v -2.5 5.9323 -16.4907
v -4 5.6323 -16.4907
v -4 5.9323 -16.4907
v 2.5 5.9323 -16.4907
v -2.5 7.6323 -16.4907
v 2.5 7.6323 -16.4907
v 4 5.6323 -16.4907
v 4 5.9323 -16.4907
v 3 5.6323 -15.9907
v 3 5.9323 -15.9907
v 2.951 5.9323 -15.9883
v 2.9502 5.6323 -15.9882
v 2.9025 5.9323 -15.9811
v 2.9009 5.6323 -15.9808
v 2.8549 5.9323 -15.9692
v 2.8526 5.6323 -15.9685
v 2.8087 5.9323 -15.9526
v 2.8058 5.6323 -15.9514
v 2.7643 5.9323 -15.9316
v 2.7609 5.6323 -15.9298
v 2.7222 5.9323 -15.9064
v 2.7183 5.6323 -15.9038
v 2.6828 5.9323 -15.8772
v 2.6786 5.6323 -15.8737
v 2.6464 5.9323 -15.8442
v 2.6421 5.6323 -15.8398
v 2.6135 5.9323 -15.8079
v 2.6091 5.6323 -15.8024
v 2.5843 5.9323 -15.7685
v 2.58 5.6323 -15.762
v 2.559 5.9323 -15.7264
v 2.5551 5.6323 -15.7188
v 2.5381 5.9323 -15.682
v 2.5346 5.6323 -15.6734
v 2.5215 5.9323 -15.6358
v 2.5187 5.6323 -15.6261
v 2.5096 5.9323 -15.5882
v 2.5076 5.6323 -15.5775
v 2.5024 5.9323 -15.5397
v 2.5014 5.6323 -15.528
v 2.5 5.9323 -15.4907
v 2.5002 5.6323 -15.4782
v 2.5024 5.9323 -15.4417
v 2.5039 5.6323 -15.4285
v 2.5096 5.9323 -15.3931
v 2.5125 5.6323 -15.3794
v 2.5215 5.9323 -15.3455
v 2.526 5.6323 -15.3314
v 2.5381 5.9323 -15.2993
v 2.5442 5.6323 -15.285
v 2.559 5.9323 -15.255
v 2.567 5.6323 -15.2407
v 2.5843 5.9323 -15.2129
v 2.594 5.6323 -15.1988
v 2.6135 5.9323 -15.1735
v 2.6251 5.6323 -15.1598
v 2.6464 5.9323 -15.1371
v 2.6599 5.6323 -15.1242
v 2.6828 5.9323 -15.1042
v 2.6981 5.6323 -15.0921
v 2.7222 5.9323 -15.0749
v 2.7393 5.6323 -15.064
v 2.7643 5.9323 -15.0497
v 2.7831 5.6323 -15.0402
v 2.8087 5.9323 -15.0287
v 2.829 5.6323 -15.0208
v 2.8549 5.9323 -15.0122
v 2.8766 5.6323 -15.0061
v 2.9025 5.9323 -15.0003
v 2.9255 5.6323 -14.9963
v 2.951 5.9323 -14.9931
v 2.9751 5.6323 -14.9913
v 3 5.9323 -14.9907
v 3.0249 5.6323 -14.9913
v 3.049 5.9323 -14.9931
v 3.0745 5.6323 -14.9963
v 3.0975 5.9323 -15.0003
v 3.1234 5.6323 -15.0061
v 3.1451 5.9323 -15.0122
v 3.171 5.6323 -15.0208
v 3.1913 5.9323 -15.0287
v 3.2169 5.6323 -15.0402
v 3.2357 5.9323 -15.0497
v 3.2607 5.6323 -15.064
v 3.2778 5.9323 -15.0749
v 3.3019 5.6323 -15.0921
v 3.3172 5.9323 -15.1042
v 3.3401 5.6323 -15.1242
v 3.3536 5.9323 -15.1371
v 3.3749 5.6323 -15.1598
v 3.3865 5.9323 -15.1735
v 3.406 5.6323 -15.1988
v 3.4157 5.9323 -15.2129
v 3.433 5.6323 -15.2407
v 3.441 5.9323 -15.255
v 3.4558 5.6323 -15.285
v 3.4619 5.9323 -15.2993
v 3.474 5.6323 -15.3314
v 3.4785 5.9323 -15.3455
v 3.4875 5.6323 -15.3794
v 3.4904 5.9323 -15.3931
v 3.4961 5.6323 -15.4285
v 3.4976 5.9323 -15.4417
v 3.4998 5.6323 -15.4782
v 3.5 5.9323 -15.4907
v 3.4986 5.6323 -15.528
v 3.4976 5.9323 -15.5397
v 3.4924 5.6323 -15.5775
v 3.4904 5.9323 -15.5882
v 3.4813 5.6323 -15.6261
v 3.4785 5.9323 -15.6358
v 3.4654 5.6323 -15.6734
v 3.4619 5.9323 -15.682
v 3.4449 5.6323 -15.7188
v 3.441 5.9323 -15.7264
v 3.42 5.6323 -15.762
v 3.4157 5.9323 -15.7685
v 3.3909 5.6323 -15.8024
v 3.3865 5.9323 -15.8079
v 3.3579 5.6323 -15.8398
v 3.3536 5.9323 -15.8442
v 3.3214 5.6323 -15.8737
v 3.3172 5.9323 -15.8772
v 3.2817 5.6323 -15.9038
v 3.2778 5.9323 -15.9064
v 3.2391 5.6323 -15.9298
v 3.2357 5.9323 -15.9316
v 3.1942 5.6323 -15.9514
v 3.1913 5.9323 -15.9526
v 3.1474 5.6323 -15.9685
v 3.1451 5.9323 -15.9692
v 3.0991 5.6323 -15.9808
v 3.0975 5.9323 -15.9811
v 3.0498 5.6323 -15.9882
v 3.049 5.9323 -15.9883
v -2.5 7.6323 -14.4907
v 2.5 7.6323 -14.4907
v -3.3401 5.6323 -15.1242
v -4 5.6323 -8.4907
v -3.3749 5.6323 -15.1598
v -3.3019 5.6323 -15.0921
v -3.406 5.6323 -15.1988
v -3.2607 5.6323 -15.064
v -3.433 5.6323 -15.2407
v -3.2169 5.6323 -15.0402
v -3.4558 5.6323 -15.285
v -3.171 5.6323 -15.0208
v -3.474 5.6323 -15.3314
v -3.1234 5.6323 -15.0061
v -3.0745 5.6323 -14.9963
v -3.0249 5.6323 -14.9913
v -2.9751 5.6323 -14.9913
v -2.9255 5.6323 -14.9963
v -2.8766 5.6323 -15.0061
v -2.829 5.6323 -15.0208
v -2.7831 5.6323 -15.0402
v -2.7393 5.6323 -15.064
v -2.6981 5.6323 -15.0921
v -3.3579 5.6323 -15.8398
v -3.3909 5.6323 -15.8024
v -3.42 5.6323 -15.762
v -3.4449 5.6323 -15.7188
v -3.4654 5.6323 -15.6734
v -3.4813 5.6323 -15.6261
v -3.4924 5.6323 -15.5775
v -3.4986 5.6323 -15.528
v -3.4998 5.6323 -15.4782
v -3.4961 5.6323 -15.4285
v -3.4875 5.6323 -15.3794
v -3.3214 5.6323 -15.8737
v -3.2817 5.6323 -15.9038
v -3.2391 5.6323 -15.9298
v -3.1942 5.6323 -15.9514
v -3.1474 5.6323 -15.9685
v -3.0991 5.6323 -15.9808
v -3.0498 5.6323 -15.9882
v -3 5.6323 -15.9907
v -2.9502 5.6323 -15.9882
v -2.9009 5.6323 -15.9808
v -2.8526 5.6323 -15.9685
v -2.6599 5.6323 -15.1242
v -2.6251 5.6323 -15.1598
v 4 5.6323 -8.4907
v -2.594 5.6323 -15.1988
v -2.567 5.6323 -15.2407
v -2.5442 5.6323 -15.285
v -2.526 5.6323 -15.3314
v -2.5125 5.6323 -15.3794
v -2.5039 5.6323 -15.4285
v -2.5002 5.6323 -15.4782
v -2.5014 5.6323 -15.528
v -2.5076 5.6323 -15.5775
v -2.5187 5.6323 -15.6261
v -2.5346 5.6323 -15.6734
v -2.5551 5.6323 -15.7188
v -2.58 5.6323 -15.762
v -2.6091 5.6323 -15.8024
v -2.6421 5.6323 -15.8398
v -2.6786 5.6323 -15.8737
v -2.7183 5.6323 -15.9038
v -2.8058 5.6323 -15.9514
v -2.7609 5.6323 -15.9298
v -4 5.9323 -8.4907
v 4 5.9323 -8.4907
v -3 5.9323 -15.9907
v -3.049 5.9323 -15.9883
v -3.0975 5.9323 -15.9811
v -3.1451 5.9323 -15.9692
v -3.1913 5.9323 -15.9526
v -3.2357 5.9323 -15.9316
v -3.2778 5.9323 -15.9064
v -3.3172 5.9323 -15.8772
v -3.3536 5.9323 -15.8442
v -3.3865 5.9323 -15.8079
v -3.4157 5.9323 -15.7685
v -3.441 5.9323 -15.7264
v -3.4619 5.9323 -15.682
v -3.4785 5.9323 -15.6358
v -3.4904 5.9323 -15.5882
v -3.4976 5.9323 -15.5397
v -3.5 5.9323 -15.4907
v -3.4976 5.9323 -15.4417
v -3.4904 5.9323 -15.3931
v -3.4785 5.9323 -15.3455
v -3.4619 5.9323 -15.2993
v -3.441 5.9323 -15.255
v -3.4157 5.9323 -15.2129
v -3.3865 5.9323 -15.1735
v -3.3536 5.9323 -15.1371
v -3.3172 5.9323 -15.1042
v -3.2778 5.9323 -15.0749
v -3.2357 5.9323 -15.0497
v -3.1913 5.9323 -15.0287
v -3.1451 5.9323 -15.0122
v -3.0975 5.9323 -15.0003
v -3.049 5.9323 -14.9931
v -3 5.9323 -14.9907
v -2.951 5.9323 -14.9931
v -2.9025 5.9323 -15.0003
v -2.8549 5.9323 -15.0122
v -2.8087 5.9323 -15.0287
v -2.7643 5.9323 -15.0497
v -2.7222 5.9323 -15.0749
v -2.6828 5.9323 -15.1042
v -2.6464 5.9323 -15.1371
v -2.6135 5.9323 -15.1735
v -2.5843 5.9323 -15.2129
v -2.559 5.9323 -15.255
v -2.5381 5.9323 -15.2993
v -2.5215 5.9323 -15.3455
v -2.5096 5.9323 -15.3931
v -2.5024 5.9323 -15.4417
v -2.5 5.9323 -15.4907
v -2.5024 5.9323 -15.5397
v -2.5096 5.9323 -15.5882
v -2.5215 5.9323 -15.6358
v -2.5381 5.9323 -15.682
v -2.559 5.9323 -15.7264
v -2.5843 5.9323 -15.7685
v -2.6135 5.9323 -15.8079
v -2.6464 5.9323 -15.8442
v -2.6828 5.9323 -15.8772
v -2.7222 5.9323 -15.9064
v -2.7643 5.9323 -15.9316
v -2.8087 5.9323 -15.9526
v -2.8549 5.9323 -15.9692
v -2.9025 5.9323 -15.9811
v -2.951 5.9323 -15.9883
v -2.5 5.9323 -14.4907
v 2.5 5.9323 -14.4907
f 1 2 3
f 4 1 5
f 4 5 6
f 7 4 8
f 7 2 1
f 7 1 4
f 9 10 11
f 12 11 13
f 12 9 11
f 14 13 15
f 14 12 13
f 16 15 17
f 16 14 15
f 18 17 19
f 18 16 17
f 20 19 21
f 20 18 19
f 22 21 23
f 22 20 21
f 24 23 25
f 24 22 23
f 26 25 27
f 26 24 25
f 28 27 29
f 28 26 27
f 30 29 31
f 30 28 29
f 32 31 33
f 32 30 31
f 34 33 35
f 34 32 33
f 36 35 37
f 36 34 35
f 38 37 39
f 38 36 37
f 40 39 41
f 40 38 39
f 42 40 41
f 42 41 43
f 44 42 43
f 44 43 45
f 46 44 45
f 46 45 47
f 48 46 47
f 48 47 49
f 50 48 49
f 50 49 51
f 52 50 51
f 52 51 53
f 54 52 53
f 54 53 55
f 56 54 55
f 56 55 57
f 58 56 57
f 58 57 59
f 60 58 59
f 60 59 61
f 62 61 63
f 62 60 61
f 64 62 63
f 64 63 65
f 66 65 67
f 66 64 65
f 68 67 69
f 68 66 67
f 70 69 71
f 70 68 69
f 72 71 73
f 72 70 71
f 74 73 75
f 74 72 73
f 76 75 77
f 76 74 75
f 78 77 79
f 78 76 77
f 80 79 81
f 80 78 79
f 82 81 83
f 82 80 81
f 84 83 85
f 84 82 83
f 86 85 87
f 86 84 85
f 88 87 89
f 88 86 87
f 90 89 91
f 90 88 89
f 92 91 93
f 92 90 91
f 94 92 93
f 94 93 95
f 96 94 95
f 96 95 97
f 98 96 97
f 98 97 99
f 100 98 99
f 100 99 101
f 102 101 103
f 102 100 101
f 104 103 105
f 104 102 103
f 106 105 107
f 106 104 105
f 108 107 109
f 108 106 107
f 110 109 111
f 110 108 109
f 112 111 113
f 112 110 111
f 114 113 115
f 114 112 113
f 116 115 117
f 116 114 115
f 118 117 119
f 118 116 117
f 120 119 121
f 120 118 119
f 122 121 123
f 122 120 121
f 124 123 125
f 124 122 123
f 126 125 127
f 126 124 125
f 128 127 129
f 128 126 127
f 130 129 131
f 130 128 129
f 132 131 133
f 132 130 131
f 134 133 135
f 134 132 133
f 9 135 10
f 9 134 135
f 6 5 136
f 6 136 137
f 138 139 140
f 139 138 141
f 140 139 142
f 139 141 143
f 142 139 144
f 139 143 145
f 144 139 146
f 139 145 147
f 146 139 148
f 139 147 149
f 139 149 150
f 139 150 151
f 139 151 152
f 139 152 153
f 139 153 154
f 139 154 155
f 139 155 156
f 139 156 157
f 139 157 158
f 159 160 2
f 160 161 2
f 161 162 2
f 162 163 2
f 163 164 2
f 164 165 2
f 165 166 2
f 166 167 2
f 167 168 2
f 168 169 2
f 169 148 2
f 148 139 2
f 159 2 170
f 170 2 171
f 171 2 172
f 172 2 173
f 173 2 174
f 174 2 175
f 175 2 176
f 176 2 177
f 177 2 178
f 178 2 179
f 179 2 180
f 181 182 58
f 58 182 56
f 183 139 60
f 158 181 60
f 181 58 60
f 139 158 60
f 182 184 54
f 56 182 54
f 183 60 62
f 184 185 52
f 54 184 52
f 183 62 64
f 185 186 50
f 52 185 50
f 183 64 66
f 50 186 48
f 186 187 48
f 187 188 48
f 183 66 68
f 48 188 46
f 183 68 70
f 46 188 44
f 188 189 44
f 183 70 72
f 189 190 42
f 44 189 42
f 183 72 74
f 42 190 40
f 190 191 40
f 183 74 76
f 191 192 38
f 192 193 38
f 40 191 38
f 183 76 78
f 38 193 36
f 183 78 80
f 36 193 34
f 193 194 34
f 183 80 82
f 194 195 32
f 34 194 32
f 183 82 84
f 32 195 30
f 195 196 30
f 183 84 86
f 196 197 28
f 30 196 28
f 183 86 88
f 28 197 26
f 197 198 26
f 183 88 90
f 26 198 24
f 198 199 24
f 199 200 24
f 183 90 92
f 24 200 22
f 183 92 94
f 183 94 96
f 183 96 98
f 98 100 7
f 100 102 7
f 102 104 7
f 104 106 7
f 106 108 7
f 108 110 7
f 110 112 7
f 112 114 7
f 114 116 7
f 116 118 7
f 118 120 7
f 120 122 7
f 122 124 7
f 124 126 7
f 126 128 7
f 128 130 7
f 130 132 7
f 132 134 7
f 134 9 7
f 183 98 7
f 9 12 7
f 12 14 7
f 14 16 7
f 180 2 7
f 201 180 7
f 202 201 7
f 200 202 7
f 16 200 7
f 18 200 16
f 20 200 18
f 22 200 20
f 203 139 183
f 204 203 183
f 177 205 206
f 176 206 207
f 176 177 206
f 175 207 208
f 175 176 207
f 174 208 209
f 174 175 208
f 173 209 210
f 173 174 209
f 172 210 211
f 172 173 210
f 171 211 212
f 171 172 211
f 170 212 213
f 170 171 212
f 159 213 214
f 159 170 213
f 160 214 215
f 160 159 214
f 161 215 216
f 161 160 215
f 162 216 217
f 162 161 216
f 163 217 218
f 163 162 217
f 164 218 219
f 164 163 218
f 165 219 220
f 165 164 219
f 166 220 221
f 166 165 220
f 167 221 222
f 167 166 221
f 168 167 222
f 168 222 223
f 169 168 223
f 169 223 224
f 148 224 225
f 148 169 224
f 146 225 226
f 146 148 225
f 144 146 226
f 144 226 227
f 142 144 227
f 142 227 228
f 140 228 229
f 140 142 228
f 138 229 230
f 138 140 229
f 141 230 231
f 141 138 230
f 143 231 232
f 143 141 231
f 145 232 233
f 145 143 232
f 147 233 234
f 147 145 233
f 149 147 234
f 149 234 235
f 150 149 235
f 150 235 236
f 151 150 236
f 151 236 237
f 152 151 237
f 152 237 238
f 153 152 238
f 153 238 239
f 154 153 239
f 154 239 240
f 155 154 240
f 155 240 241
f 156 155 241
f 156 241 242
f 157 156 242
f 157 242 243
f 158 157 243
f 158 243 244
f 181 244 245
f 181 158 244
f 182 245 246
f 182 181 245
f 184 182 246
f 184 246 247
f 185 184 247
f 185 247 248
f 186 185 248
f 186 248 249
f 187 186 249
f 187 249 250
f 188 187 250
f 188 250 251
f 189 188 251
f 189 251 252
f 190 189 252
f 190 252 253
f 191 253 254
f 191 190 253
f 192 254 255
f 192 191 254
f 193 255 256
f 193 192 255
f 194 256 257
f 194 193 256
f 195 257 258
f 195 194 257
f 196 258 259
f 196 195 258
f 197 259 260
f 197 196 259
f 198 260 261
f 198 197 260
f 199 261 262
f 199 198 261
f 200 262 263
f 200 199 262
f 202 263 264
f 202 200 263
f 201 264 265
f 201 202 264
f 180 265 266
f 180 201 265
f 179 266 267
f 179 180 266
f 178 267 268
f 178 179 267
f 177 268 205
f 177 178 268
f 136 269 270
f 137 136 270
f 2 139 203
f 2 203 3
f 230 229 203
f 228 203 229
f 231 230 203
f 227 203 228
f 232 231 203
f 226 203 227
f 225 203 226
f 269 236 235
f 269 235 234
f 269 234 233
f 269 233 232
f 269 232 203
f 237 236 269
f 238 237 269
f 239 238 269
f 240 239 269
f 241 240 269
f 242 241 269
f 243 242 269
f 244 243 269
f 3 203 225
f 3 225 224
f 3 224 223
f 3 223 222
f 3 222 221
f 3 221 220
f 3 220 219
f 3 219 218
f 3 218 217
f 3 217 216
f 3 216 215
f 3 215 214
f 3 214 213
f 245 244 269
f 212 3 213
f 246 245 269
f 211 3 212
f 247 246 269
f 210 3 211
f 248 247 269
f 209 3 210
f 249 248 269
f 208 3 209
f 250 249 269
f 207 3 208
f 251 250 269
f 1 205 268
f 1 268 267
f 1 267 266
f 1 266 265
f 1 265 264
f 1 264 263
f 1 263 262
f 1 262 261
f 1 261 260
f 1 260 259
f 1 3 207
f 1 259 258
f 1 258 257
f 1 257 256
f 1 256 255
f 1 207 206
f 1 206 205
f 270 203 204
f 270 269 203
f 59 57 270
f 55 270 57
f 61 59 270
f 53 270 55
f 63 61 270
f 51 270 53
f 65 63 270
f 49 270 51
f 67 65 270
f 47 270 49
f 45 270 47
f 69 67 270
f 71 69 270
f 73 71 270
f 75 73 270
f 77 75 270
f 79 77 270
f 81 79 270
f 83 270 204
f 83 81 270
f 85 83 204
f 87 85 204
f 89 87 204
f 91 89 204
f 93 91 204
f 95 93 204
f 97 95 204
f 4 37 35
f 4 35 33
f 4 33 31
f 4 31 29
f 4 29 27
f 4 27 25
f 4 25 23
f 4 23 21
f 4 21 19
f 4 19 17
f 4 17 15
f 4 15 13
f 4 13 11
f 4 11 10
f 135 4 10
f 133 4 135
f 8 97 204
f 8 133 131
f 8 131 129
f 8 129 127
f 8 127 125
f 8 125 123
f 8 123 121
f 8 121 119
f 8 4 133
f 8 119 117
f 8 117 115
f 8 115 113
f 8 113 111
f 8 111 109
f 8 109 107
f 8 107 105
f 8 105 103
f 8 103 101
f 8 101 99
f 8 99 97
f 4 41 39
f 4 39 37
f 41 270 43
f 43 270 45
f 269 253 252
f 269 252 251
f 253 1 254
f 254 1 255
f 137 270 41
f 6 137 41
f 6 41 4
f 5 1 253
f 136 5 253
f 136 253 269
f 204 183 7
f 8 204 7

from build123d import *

# Parameters (mm, degrees)
SKETCH1_W           = 80
SKETCH1_H           = 80
SKETCH1_R           = 5
BOSS_EXTRUDE2_DEPTH = 3
BOSS_EXTRUDE3_DEPTH = 20
SCALE2_SCALE        = 0.1


with BuildPart() as part:
    # Sketch1 → Boss-Extrude2 (new body)
    with BuildSketch(Plane(origin=(0, 0, 0), x_dir=(1, 0, 0), z_dir=(0, 1, 0))):
        Rectangle(SKETCH1_W, SKETCH1_H)
        with Locations((-30, 30)):
            Circle(SKETCH1_R, mode=Mode.SUBTRACT)
        with Locations((30, 30)):
            Circle(SKETCH1_R, mode=Mode.SUBTRACT)
    extrude(amount=BOSS_EXTRUDE2_DEPTH)

    # Sketch1<5> → Boss-Extrude3 (add)
    with BuildSketch(Plane(origin=(0, 0, 0), x_dir=(1, 0, 0), z_dir=(0, 1, 0))):
        Polygon((25, 40), (-25, 40), (-25, 30), (-25, 20), (25, 20), (25, 30), align=None)
    extrude(amount=BOSS_EXTRUDE3_DEPTH)


with BuildPart() as part_1:
    # Scale2: scaled about (0, 6.258071502, -13.878534205)
    add(part.part.scale(SCALE2_SCALE).moved(Location((0, 5.632264352, -12.490680785))))


solid = part_1.part
